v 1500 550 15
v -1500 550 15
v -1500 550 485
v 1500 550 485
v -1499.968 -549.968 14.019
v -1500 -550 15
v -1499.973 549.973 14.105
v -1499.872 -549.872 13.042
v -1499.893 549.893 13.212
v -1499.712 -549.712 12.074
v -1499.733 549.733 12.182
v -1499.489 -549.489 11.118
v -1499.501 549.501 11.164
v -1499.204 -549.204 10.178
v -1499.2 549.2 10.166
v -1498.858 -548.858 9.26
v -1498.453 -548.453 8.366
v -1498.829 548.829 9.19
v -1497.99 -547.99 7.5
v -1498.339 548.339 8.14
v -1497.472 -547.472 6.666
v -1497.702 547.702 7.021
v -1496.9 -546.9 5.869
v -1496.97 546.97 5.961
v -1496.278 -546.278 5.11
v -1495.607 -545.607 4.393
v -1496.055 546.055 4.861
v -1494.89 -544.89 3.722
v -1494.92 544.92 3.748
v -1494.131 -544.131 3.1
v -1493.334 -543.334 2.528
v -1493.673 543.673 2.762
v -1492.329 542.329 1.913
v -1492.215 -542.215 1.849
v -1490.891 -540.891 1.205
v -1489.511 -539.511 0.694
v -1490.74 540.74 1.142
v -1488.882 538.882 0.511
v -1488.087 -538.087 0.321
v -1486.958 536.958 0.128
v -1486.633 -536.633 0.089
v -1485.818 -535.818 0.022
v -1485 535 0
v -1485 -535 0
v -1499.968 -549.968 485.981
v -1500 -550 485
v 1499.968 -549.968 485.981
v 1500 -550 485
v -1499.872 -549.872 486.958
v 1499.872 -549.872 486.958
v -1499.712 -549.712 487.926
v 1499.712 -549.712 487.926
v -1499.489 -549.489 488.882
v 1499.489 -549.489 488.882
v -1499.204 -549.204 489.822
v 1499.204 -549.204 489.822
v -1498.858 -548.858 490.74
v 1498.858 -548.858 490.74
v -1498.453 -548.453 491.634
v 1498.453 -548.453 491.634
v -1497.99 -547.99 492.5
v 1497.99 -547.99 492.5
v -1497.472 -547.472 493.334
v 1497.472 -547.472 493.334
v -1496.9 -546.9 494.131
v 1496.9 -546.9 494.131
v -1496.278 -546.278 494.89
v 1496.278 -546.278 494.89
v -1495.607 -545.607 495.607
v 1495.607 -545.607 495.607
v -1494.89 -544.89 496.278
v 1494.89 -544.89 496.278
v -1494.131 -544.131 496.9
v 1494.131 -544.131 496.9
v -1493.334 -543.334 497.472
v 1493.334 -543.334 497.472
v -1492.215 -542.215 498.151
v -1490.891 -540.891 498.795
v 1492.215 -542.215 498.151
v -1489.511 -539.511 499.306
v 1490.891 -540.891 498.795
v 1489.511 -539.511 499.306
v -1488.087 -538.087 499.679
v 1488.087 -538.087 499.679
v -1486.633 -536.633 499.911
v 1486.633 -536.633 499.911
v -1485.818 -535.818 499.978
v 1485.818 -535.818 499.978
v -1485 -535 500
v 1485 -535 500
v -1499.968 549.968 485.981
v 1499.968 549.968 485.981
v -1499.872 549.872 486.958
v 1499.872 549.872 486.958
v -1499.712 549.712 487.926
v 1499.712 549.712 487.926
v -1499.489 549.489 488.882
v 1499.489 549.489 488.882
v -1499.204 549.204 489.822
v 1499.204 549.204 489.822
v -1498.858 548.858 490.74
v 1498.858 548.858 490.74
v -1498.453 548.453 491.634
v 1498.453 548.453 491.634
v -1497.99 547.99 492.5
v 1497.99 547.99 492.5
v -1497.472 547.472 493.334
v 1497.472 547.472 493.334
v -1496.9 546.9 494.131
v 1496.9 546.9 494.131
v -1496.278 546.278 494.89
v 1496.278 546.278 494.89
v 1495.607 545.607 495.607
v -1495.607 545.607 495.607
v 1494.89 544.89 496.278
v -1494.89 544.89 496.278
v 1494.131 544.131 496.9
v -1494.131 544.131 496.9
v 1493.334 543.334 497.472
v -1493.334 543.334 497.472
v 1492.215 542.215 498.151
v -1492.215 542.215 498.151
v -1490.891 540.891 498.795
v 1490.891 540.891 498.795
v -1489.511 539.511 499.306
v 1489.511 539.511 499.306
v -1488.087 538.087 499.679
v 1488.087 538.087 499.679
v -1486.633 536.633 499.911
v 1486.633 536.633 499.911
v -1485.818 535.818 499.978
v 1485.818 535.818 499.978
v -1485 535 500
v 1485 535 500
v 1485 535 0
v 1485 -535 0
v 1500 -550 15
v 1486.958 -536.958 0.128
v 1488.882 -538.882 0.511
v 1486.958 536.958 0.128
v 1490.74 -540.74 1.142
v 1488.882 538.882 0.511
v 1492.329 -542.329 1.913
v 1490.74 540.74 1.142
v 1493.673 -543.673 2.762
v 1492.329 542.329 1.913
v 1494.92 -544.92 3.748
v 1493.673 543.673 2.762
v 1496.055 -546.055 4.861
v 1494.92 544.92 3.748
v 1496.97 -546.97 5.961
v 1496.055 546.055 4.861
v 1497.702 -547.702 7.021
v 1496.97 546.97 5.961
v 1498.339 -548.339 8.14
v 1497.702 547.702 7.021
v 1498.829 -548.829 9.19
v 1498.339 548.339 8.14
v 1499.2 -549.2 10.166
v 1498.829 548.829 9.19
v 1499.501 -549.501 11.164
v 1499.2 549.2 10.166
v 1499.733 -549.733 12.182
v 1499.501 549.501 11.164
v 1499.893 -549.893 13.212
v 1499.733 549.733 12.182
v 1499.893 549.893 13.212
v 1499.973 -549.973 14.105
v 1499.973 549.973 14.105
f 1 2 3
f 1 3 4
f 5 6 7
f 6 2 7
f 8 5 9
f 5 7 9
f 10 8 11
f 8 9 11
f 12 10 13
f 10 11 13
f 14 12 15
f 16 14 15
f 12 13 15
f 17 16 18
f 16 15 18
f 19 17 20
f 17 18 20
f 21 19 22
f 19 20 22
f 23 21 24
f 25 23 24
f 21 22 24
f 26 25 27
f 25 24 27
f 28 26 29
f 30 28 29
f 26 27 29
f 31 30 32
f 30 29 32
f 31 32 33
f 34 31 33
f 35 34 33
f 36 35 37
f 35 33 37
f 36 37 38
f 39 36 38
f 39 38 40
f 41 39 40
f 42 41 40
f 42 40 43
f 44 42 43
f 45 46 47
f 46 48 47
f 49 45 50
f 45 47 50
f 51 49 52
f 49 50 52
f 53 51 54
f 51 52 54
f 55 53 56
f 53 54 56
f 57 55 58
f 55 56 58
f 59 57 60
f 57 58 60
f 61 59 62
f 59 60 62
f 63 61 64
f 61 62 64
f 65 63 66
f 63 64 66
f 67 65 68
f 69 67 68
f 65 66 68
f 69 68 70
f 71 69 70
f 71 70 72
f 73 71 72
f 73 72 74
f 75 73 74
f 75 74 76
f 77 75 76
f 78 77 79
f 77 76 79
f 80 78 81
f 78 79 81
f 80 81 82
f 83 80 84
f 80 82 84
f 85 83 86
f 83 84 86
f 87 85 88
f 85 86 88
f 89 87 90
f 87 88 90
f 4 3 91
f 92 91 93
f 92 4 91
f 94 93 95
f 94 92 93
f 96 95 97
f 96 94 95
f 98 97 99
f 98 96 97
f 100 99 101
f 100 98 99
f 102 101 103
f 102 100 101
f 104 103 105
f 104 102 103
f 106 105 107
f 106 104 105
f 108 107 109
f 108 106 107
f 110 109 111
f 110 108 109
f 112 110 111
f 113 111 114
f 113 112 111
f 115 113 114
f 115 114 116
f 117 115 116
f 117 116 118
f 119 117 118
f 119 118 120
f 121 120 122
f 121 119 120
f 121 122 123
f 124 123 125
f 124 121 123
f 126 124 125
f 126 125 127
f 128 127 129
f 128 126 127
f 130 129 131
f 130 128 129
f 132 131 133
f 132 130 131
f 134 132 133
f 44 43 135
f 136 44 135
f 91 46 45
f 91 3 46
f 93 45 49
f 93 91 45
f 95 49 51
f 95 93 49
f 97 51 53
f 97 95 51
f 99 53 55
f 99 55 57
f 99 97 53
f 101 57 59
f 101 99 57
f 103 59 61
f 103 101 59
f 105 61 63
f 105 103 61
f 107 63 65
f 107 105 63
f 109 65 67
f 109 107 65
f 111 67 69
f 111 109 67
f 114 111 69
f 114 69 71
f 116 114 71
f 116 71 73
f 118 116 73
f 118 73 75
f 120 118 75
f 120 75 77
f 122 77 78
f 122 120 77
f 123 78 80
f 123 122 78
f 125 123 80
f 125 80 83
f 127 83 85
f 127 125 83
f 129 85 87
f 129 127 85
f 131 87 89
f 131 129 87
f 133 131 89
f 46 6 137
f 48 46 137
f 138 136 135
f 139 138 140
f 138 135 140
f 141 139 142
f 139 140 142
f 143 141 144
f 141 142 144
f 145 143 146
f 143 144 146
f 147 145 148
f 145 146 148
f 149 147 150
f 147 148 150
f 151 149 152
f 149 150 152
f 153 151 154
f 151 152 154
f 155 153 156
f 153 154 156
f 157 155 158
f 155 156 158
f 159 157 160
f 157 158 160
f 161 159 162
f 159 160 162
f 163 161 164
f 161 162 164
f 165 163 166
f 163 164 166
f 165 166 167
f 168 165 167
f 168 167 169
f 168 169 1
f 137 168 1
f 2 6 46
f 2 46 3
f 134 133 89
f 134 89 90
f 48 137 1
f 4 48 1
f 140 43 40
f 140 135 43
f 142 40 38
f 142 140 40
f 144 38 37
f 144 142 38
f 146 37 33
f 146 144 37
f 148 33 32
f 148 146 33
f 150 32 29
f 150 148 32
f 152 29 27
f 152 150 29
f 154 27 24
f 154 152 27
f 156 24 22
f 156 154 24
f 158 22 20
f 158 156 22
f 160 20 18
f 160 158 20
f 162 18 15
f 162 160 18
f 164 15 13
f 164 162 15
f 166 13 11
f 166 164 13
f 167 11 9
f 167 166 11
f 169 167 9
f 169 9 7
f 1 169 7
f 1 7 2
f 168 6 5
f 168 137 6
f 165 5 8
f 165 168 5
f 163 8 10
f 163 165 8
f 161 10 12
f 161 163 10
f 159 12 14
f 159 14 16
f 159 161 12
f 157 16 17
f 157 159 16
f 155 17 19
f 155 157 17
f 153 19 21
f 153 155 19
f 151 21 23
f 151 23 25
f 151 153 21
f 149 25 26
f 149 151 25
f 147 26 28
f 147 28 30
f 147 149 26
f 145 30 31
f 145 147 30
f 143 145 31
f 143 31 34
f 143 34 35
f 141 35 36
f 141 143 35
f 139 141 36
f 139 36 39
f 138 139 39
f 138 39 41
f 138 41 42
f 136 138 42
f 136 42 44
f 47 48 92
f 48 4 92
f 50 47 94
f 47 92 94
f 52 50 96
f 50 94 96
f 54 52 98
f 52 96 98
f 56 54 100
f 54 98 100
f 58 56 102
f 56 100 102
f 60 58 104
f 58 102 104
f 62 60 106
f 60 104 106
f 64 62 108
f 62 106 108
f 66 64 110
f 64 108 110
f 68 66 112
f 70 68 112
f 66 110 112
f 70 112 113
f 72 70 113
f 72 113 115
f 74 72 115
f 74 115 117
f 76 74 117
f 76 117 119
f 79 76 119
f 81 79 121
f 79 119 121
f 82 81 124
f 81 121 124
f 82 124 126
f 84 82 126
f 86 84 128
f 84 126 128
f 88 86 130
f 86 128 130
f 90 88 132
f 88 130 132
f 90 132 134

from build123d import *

# Parameters (mm, degrees)
SKETCH_W    = 3000
SKETCH_H    = 1100
PAD_DEPTH   = 500
FILLET_R    = 15
FILLET001_R = 15


with BuildPart() as part:
    # Sketch → Pad (new body)
    with BuildSketch(Plane.XY):
        Rectangle(SKETCH_W, SKETCH_H)
    extrude(amount=PAD_DEPTH)

    # Fillet
    fillet_edges = [part.edges().sort_by_distance(p)[0] for p in [
        (0, 550, 500),
        (1500, 0, 500),
        (0, -550, 500),
        (-1500, 0, 500),
    ]]
    fillet(fillet_edges, radius=FILLET_R)

    # Fillet001
    fillet001_edges = [part.edges().sort_by_distance(p)[0] for p in [
        (0, 550, 0),
        (1500, 0, 0),
        (0, -550, 0),
        (-1500, 0, 0),
    ]]
    fillet(fillet001_edges, radius=FILLET001_R)


solid = part.part
